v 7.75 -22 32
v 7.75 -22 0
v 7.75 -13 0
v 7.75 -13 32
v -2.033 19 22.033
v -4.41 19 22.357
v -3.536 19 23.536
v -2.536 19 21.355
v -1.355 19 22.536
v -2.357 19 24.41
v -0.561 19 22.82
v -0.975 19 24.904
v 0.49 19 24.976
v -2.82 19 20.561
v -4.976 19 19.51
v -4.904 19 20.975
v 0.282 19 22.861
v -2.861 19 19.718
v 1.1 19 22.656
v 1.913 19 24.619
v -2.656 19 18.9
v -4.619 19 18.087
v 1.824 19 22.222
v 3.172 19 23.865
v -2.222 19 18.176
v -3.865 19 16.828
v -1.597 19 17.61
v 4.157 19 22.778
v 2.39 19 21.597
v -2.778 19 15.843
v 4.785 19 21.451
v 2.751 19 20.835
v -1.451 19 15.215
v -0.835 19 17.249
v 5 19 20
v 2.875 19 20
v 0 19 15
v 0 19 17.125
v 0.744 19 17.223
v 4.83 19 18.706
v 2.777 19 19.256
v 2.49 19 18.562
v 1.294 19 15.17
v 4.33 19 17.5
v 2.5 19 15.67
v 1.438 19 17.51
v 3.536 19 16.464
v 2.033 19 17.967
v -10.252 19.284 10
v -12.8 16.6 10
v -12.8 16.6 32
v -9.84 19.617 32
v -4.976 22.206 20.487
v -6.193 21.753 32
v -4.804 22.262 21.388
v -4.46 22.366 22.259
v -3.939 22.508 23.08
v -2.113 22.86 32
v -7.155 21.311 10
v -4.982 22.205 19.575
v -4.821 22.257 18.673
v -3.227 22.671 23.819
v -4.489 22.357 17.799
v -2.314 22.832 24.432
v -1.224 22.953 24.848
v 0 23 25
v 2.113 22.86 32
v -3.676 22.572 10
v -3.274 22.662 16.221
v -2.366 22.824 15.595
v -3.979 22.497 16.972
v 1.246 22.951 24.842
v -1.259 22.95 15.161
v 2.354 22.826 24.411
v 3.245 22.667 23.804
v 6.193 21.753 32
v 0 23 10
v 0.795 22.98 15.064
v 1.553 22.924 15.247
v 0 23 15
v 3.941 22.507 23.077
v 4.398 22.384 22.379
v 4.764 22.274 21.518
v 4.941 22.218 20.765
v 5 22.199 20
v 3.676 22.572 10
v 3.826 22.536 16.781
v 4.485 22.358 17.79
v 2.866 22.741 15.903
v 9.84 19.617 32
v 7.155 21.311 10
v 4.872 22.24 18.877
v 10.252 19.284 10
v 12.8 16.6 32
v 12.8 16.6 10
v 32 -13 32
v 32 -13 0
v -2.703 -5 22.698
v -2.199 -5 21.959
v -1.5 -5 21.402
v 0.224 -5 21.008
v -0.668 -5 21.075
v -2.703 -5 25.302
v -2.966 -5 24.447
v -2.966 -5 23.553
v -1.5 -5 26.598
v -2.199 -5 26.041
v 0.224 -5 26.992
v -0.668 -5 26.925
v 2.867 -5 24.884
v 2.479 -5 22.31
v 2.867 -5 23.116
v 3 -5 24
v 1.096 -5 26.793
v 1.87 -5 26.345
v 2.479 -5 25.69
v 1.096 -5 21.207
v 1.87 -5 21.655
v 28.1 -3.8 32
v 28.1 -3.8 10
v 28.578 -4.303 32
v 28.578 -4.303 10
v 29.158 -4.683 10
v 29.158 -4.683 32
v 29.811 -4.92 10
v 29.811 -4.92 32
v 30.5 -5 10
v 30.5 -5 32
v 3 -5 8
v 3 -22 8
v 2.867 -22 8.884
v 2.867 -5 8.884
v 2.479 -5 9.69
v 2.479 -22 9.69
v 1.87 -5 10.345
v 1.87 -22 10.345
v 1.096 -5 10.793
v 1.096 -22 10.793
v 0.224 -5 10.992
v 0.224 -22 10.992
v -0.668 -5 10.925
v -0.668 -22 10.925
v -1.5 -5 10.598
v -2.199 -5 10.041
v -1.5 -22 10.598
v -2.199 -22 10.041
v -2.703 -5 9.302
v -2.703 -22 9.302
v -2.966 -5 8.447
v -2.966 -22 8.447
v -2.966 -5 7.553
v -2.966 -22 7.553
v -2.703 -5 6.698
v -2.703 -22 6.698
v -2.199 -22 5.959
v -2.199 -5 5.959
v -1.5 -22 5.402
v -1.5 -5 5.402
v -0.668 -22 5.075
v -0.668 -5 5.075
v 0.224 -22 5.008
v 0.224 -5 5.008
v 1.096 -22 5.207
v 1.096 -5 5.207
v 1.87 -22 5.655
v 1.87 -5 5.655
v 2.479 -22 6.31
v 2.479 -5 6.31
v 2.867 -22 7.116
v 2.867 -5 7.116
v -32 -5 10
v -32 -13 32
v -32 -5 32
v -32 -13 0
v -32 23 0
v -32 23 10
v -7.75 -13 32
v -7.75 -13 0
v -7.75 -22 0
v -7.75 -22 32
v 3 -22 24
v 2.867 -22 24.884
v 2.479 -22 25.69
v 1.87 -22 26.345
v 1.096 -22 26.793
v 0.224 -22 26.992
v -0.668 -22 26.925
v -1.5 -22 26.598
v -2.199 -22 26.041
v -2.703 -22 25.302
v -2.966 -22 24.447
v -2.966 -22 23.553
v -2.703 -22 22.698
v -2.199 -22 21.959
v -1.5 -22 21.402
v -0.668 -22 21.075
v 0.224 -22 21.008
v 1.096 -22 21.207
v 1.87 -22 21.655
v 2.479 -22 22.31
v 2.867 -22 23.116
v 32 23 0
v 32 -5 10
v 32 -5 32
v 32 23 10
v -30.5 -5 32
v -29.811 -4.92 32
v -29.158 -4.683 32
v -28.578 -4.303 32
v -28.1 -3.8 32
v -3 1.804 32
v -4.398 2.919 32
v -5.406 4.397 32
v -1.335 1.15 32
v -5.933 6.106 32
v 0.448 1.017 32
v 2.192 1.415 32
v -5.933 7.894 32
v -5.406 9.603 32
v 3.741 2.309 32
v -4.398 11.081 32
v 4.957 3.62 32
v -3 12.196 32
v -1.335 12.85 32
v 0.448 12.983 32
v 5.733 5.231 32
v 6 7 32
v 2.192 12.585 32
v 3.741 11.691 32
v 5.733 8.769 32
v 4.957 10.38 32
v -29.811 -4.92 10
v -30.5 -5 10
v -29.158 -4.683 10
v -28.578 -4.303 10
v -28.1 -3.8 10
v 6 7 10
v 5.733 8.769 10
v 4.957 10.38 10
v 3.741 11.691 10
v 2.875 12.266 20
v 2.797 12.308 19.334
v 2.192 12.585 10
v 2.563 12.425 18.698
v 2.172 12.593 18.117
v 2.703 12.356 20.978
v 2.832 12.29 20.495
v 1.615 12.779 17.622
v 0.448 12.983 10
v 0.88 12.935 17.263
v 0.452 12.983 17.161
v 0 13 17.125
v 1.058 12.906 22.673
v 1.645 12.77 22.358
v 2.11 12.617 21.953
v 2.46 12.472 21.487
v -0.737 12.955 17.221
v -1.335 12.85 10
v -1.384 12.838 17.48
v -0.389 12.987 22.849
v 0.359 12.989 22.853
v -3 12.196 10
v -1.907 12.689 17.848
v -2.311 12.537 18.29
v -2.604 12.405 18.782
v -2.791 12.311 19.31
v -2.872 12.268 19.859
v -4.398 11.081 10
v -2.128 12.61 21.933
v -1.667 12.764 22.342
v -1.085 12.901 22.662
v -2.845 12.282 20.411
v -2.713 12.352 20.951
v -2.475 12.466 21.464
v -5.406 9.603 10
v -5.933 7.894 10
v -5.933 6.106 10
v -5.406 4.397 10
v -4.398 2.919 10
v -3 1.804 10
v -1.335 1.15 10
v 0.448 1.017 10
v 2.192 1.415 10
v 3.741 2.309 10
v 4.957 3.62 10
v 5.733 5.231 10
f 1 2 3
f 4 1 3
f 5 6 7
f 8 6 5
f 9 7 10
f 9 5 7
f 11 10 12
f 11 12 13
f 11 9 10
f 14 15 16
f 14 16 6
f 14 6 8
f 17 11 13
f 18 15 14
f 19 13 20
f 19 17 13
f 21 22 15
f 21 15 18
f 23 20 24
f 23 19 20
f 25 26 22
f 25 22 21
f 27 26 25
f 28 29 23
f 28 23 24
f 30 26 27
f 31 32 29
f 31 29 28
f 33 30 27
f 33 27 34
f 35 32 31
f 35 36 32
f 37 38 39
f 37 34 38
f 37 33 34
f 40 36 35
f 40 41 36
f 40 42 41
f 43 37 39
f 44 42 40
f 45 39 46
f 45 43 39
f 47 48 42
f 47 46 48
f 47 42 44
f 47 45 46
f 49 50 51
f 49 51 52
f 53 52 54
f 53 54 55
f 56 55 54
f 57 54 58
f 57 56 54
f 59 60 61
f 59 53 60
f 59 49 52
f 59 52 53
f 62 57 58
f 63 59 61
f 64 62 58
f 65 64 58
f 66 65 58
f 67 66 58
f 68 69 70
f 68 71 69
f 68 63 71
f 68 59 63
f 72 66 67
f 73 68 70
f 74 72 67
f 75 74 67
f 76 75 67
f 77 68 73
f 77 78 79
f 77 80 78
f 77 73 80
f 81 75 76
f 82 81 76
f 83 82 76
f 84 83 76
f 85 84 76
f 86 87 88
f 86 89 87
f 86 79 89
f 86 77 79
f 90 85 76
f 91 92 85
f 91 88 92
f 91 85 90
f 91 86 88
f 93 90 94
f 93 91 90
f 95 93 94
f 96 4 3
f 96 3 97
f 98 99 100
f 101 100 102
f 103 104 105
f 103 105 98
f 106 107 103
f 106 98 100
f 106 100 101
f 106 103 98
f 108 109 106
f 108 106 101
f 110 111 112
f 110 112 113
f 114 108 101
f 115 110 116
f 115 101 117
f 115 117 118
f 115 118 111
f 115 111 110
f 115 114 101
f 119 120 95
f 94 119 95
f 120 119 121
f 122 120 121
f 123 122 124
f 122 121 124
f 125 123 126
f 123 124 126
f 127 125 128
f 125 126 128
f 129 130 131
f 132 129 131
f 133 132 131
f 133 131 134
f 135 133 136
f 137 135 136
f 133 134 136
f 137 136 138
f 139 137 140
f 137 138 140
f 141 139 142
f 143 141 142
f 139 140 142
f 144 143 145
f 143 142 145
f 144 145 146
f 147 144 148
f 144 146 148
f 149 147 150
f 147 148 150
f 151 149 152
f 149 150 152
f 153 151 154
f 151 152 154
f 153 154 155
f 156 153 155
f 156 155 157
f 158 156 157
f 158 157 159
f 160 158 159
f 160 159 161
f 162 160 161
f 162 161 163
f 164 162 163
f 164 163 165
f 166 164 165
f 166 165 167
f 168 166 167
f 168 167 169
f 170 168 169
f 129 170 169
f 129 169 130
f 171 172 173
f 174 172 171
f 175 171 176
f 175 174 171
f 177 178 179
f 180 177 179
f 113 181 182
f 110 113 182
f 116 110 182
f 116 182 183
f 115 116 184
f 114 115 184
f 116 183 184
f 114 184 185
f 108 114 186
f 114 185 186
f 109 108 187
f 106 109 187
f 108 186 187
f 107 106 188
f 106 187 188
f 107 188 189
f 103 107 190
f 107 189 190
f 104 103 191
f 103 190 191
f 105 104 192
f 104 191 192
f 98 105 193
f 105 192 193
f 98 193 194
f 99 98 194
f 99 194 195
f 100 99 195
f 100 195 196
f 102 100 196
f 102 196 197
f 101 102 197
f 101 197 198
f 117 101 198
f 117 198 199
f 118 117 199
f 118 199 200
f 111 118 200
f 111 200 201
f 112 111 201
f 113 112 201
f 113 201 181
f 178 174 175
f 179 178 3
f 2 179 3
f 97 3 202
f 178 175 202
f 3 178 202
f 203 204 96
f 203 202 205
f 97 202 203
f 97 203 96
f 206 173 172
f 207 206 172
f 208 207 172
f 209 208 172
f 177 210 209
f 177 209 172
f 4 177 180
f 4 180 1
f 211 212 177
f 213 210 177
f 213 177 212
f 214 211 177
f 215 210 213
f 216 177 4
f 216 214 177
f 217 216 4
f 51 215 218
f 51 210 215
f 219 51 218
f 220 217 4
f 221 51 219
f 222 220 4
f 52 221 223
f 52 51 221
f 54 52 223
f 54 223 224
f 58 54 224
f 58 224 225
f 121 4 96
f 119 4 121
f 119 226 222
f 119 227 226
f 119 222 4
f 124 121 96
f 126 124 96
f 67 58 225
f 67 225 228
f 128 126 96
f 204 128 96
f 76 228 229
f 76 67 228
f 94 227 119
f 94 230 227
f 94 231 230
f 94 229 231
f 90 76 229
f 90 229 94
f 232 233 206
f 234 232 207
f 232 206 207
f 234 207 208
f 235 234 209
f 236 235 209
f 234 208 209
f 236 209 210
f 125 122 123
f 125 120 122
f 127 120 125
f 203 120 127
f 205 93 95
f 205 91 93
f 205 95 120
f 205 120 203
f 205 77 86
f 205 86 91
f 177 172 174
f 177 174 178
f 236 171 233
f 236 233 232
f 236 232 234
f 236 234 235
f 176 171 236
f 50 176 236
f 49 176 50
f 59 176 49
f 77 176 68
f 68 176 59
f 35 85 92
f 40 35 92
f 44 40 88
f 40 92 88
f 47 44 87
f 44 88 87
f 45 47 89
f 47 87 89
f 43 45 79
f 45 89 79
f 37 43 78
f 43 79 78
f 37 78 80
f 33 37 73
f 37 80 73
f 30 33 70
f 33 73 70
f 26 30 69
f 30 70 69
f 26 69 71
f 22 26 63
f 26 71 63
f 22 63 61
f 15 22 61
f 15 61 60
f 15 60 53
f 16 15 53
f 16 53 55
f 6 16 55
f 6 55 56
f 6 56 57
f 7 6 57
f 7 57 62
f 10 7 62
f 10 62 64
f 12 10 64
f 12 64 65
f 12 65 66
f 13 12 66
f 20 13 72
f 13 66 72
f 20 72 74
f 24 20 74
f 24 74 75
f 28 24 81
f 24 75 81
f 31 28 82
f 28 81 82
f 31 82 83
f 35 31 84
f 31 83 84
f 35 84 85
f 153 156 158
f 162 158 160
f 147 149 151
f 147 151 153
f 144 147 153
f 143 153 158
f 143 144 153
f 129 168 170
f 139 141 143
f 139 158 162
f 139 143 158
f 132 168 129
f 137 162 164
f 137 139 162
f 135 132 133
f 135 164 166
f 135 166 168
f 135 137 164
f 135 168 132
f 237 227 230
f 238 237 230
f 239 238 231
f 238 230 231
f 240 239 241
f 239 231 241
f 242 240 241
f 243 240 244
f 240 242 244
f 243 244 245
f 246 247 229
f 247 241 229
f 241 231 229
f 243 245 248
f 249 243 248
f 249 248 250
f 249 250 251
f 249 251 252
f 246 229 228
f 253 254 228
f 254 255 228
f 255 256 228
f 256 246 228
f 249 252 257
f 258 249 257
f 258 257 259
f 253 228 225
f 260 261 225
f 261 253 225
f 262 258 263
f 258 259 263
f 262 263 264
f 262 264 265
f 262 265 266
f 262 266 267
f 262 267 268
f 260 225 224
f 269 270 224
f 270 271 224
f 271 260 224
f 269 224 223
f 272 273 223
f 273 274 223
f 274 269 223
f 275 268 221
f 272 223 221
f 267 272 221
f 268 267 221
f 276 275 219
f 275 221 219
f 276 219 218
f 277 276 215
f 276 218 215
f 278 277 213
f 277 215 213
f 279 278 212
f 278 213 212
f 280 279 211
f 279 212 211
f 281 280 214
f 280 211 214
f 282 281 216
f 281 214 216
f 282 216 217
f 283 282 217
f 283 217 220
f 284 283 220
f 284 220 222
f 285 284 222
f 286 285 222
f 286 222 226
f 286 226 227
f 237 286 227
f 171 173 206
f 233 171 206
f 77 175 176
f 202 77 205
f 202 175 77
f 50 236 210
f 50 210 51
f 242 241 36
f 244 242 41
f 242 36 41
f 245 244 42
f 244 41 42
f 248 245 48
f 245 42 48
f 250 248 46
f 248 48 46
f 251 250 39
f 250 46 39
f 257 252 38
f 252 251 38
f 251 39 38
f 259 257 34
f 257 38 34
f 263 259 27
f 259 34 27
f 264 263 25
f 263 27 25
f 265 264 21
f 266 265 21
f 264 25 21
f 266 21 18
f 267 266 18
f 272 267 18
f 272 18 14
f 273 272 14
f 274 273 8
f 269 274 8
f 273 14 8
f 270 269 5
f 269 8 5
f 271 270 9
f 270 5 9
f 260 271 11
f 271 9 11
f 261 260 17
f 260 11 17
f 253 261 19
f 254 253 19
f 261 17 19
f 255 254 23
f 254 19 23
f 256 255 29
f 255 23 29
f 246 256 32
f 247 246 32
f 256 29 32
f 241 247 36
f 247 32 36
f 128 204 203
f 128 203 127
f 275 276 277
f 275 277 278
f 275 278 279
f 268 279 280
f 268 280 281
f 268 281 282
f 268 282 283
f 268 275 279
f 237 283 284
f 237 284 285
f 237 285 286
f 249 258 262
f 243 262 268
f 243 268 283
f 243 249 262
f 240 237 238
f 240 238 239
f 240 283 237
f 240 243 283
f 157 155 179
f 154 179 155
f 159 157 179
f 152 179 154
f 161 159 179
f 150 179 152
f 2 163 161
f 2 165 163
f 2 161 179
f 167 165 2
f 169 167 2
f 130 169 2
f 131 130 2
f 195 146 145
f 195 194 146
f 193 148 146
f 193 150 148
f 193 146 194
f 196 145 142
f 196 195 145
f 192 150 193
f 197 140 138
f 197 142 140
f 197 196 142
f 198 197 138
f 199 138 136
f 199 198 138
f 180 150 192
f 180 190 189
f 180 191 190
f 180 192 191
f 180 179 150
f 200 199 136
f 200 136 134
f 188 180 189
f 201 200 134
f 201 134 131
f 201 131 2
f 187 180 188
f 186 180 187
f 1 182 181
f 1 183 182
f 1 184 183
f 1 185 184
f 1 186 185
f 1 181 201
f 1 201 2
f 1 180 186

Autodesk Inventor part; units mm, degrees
ref_plane "YZ Plane" through (0, 0, 0) normal (1, 0, 0) x (0, 1, 0)
ref_plane "XZ Plane" through (0, 0, 0) normal (0, 1, 0) x (-1, 0, 0)
ref_plane "XY Plane" through (0, 0, 0) normal (0, 0, 1) x (1, 0, 0)
sketch "Sketch1" plane through (0, 0, 0) normal (0, 0, 1) x (1, 0, 0)
  line L0 (-32, 23) -> (32, 23)
  line L1 (32, 23) -> (32, -13)
  line L2 (7.75, -23) -> (-7.75, -23)
  line L3 (-32, -13) -> (-32, 23)
  line L4 (7.75, -13) -> (32, -13)
  line L5 (7.75, -23) -> (7.75, -13)
  line L6 (-32, -13) -> (-7.75, -13)
  line L7 (-7.75, -13) -> (-7.75, -23)
  point P0 (0, 0)
  dimension "d2" = 32
  dimension "d3" = 23
extrude "Extrusion1" add sketch "Sketch1" along normal blind 10
sketch "Sketch2" plane through (0, 0, 10) normal (0, 0, 1) x (1, 0, 0)
  line L0 (-32, -13) -> (-7.75, -13) projected
  line L1 (-32, -13) -> (-32, -5)
  line L2 (-32, 23) -> (-32, -13) projected
  line L3 (-32, -5) -> (-29, -5)
  line L4 (32, -13) -> (32, 23) projected
  line L5 (32, -9) -> (32, -5)
  line L6 (32, -5) -> (29, -5)
  line L7 (-7.75, -13) -> (-7.75, -23) projected
  line L8 (7.75, -13) -> (32, -13) projected
  arc A0 (12.8, 16.6) -> (-12.8, 16.6) centre (0, 7) ccw
  line L9 (-29, -5) -> (-12.8, 16.6)
  line L10 (29, -5) -> (12.8, 16.6)
  line L11 (-32, -13) -> (-7.75, -13)
  line L12 (-7.75, -23) -> (7.75, -23) projected
  line L13 (-7.75, -23) -> (7.75, -23)
  line L14 (7.75, -23) -> (7.75, -13) projected
  line L15 (7.75, -23) -> (7.75, -13)
  line L16 (7.75, -13) -> (32, -13)
  line L17 (32, -5) -> (32, -13)
  point P0 (0, 0)
  dimension "d15" = 32
extrude "Extrusion2" add sketch "Sketch2" along normal blind 22
sketch "Sketch3" plane through (0, 0, 32) normal (0, 0, 1) x (1, 0, 0)
  line L0 (-32, -5) -> (-32, -13) projected
  circle A0 centre (0, 7) radius 6
  point P0 (0, 0)
extrude "Extrusion3" cut sketch "Sketch3" against normal up to surface (22 mm away)
sketch "Sketch5" plane through (-32, 23, 0) normal (0, 1, 0) x (1, 0, 0)
  line L0 (32, 0) -> (32, -20)
  circle A0 centre (32, -20) radius 5
  circle A1 centre (32, -20) radius 2.875
  dimension "d22" = 20
  dimension "d23" = 10
  dimension "d36" = 5.75
extrude "Extrusion4" cut sketch "Sketch5" against normal blind 12 contours A1
extrude "Extrusion5" cut sketch "Sketch5" against normal blind 4 contours A1 | A0
sketch "Sketch6" plane through (-7.75, -23, 0) normal (0, -1, 0) x (1, 0, 0)
  point P0 (7.75, 0)
sketch "Sketch7" plane through (-7.75, -23, 0) normal (0, -1, 0) x (1, 0, 0)
  line L0 (0, 32) -> (15.5, 32) projected
  circle A0 centre (7.75, 24) radius 3
  circle A1 centre (7.75, 8) radius 3
  point P0 (7.75, 0)
  dimension "d31" = 6
  dimension "d32" = 6
extrude "Extrusion6" cut sketch "Sketch7" against normal blind 18
fillet "Fillet1" radius 3 2 edges at (29, -5, 21) (-29, -5, 21)
sketch "Sketch8" plane through (0, 0, 32) normal (0, 0, 1) x (1, 0, 0)
  line L0 (-7.75, -22) -> (7.75, -22)
  line L1 (7.75, -22) -> (7.75, -23)
  line L2 (7.75, -23) -> (-7.75, -23)
  line L3 (-7.75, -23) -> (-7.75, -22)
  line L4 (-7.75, -23) -> (7.75, -23) projected
  line L5 (-7.75, -13) -> (-7.75, -23) projected
  line L6 (7.75, -23) -> (7.75, -13) projected
  point P0 (0, 0)
  dimension "d37" = 1
extrude "Extrusion7" cut sketch "Sketch8" against normal through all
properties part number "Pieza4_corredera_LAASR" material "Steel, Carbon"
